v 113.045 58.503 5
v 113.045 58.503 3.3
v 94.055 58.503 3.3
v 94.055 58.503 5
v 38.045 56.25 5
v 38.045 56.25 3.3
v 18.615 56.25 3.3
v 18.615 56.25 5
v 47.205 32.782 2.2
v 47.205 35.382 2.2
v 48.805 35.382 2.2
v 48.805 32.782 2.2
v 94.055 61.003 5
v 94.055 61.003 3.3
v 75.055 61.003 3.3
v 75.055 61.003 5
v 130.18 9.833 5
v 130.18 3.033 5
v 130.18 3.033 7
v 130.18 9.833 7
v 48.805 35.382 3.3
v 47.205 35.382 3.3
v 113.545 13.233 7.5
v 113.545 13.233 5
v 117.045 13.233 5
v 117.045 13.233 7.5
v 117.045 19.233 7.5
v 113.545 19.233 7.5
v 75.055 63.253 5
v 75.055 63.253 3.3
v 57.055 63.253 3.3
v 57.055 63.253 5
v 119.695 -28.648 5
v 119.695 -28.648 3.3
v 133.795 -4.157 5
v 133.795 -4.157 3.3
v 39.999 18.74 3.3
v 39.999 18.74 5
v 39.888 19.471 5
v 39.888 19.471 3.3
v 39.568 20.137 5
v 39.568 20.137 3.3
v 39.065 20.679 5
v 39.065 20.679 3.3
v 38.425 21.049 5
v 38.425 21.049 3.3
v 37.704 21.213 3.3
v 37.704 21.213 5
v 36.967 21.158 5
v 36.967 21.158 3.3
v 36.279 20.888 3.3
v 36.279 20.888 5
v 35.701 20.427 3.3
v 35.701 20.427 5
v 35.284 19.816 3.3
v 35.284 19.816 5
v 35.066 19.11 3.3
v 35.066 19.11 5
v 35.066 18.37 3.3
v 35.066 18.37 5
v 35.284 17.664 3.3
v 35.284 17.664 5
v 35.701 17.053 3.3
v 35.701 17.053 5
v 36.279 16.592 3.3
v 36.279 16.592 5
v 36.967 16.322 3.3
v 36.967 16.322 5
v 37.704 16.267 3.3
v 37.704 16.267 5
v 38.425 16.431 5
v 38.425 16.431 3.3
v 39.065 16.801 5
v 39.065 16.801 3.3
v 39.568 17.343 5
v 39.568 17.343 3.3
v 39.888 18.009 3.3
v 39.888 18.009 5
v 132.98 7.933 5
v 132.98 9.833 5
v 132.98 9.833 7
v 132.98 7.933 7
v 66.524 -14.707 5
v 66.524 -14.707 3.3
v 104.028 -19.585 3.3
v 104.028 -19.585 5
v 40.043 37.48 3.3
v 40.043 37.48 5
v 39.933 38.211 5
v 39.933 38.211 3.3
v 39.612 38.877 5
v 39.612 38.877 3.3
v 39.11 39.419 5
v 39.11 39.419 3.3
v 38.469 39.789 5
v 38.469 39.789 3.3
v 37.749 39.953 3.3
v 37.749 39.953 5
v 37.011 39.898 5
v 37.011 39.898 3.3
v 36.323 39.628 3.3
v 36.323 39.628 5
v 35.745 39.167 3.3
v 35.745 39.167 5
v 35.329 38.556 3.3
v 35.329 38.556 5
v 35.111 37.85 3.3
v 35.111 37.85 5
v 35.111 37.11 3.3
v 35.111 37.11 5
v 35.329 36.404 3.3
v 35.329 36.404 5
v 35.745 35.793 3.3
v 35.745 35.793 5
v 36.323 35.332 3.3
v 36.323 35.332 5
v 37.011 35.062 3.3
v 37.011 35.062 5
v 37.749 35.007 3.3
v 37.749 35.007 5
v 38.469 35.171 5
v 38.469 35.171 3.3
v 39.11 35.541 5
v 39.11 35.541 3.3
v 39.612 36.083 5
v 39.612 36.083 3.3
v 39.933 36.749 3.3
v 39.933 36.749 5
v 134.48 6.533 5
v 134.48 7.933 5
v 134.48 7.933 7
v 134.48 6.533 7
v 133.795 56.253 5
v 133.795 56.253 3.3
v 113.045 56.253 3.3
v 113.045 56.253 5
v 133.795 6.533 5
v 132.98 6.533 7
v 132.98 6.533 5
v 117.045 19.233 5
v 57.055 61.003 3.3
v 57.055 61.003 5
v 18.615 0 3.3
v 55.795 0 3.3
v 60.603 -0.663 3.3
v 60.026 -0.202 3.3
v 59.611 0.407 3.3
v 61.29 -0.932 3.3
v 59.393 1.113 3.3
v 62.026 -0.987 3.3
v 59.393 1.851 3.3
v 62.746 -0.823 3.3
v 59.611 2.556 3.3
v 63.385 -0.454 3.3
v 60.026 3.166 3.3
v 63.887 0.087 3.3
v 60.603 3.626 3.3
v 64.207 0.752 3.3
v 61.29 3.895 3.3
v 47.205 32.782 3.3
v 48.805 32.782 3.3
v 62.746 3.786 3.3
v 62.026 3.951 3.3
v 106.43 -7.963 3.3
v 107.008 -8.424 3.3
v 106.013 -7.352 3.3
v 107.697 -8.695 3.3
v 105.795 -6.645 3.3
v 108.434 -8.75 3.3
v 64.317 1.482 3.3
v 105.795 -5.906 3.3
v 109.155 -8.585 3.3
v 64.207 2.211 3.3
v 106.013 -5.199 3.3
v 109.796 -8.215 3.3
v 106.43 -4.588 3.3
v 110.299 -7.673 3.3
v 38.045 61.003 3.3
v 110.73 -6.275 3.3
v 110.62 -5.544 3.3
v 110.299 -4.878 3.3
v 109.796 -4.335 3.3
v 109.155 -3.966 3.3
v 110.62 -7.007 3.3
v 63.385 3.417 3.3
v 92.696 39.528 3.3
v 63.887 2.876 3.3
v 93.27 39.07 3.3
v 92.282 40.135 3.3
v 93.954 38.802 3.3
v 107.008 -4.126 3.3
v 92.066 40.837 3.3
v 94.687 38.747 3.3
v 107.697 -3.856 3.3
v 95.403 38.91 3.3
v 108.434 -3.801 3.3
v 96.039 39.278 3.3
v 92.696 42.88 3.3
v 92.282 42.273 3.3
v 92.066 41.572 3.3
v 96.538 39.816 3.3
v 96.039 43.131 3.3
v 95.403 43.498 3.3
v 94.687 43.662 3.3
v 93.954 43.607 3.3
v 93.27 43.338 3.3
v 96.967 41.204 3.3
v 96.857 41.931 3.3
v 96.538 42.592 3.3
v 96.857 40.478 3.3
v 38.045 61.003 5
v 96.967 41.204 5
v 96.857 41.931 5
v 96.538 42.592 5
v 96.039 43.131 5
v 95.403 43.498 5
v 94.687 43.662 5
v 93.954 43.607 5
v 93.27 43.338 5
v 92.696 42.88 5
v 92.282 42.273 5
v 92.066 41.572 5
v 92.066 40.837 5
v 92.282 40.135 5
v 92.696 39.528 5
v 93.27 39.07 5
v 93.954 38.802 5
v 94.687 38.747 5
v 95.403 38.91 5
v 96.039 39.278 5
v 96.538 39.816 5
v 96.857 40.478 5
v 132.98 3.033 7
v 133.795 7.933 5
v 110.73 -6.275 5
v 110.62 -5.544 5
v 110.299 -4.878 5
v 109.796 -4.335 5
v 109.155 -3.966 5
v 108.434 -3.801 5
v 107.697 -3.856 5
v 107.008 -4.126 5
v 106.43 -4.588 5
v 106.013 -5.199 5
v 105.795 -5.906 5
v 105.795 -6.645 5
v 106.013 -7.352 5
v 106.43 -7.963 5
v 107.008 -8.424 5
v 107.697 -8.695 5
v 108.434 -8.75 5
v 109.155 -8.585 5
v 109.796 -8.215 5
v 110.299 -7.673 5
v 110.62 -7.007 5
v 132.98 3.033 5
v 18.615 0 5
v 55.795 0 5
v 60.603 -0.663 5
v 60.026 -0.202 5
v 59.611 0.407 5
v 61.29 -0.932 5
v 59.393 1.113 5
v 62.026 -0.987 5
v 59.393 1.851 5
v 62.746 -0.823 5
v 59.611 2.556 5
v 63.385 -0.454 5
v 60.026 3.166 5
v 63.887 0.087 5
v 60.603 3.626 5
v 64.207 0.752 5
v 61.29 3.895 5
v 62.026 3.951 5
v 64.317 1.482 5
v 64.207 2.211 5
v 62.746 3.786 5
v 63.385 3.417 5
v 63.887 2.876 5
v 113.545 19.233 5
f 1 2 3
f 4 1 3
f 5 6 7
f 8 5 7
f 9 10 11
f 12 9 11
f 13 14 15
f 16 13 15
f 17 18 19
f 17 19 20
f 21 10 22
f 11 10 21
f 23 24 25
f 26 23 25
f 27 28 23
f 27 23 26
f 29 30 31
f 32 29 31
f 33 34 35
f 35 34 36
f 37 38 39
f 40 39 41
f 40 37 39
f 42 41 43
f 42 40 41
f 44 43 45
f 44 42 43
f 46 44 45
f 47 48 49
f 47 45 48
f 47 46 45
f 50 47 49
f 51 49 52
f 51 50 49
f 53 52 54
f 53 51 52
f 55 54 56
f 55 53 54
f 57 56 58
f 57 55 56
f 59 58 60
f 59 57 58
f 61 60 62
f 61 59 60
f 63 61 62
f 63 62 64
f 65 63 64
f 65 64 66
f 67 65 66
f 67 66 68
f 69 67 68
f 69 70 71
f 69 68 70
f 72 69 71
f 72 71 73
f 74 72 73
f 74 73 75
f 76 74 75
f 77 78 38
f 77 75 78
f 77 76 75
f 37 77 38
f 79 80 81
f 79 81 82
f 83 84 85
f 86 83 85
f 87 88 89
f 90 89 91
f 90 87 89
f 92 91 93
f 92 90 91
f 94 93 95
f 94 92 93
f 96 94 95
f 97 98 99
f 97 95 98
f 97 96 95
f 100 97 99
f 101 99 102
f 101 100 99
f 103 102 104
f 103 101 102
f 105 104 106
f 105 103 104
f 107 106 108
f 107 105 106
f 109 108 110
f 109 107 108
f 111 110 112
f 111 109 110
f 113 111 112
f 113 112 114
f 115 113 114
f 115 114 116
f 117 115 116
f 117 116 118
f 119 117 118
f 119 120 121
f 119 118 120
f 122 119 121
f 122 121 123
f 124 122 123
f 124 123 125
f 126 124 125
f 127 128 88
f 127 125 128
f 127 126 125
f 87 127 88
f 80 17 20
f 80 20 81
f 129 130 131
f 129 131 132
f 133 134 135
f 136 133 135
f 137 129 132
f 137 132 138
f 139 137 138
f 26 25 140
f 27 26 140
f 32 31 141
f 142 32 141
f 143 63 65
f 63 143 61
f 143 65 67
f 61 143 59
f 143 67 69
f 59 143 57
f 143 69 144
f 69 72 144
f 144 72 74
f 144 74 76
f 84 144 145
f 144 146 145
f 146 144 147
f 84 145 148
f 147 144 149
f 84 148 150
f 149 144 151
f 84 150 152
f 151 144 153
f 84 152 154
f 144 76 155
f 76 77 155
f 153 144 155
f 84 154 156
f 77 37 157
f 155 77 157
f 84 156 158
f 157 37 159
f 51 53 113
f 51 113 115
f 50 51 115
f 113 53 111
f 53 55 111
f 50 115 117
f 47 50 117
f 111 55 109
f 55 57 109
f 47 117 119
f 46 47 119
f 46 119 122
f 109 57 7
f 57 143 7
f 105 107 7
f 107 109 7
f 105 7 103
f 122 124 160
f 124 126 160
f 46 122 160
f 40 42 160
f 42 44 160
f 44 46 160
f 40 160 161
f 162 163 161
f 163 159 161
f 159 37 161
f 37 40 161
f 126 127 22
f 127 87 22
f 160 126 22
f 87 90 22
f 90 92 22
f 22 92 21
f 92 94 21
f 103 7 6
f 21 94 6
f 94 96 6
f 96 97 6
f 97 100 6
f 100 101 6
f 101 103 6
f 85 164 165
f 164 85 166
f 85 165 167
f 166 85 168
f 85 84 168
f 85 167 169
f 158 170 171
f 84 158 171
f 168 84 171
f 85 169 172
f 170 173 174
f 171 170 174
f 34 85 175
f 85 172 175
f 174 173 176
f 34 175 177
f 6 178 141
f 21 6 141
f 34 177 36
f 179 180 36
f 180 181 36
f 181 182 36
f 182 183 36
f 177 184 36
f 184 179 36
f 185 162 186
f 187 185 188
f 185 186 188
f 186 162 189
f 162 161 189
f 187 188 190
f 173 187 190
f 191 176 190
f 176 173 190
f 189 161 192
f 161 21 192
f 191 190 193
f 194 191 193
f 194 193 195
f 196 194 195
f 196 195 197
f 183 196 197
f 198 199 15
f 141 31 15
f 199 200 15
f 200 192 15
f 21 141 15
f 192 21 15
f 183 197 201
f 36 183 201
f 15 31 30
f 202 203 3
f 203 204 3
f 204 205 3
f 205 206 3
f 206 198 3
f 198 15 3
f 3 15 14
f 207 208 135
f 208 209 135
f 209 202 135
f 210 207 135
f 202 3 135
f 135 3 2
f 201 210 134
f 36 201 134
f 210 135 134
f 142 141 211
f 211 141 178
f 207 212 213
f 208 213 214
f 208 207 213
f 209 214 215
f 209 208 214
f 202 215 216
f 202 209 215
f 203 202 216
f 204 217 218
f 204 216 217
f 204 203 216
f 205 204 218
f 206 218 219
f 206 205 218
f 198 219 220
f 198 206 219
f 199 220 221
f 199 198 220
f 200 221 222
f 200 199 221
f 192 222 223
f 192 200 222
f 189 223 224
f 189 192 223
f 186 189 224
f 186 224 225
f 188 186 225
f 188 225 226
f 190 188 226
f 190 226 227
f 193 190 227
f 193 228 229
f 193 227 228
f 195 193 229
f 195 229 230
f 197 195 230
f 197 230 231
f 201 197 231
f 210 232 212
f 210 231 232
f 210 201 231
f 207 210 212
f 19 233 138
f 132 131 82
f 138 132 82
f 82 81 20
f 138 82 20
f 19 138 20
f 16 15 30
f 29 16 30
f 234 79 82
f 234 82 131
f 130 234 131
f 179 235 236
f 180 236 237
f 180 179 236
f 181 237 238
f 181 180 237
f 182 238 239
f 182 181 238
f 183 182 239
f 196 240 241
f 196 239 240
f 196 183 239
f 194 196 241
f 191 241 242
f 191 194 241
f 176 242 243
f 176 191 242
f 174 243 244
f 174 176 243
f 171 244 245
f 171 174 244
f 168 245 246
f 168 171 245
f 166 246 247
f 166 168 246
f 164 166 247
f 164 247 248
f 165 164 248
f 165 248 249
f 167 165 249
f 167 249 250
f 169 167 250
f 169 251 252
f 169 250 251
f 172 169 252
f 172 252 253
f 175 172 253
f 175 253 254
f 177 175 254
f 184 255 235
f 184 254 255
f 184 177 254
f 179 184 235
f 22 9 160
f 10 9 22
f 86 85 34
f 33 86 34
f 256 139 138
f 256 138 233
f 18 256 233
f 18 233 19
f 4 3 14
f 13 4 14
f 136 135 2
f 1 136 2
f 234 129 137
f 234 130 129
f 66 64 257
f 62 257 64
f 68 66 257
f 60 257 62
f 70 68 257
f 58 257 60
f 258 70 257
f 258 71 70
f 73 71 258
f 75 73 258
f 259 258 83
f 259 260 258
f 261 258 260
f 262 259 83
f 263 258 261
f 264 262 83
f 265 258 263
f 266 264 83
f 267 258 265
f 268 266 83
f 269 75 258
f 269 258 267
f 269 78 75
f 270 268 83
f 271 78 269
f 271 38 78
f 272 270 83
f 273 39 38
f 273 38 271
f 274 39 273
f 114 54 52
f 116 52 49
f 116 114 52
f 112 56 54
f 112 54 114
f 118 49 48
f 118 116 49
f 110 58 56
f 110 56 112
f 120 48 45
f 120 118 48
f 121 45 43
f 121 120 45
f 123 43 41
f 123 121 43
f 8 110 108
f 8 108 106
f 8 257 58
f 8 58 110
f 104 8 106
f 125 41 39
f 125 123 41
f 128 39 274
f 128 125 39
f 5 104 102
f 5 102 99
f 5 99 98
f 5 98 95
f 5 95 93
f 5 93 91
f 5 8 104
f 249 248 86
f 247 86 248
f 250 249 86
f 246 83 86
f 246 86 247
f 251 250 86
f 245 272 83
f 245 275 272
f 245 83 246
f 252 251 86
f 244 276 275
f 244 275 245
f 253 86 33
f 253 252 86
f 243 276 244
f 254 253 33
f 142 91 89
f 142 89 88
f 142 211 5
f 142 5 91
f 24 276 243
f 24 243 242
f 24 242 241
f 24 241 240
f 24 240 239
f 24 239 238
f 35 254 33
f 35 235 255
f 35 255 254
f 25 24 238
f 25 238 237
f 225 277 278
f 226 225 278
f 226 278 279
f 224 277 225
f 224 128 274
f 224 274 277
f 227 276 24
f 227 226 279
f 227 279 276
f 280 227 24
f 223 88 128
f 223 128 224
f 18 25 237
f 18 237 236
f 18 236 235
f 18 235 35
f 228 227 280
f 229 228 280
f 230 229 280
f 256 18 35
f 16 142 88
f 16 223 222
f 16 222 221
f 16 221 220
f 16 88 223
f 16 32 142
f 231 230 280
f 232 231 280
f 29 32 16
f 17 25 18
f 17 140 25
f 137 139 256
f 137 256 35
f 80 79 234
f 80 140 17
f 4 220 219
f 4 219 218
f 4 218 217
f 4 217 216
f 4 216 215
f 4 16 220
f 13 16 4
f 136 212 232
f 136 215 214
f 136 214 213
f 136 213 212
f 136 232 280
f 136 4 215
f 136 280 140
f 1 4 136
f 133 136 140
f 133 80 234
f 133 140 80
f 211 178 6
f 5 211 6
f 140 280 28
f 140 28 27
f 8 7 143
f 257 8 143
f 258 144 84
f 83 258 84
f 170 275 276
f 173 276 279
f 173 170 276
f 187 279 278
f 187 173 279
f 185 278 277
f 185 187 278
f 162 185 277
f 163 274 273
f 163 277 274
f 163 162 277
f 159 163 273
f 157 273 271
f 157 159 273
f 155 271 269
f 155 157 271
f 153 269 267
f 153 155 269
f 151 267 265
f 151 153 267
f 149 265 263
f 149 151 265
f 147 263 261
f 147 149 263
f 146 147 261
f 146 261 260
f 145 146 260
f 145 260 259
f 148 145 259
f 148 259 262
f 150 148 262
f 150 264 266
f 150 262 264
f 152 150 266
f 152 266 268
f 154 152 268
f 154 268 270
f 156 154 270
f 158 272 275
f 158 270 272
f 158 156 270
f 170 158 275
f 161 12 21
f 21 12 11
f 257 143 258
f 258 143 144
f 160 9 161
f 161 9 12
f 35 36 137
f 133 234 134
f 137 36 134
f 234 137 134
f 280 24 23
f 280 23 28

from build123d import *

# Parameters (mm, degrees)
PAD011_DEPTH    = 1.7
SKETCH021_R     = 2.475826
SKETCH021_R_2   = 2.481394
SKETCH021_R_3   = 2.464202
SKETCH021_R_4   = 2.48
POCKET021_DEPTH = 2
SKETCH022_W     = 1.6
SKETCH022_H     = 2.6
PAD012_DEPTH    = 1.1
SKETCH025_W     = 3.5
SKETCH025_H     = 6
PAD014_DEPTH    = 2.5
PAD015_DEPTH    = 2


with BuildPart() as part:
    # MirroredSketch016 → Pad011 (new body)
    with BuildSketch(Plane.XY):
        Polygon((18.615471, 0), (55.795471, 0), (66.524073, -14.707193), (104.028226, -19.584789), (119.695382, -28.648464), (133.795471, -4.157341), (133.795471, 56.252659), (113.045471, 56.252659), (113.045471, 58.502659), (94.055471, 58.502659), (94.055471, 61.002659), (75.055471, 61.002659), (75.055471, 63.252659), (57.055471, 63.252659), (57.055471, 61.002659), (38.045471, 61.002659), (38.045471, 56.25), (18.615471, 56.25), align=None)
    extrude(amount=PAD011_DEPTH)

    # Sketch021 → Pocket021 (cut)
    with BuildSketch(Plane.XY):
        with Locations((61.841369, 1.48161)):
            Circle(SKETCH021_R)
        with Locations((108.248942, -6.275442)):
            Circle(SKETCH021_R_2)
        with Locations((94.502421, 41.204275)):
            Circle(SKETCH021_R_3)
        with Locations((37.563327, 37.48)):
            Circle(SKETCH021_R_4)
        with Locations((37.51863, 18.740053)):
            Circle(SKETCH021_R_4)
    extrude(amount=POCKET021_DEPTH, mode=Mode.SUBTRACT)

    # Sketch022 → Pad012 (join)
    with BuildSketch(Plane.XY.offset(-1.1)):
        with Locations((48.005105, 34.081744)):
            Rectangle(SKETCH022_W, SKETCH022_H)
    extrude(amount=PAD012_DEPTH)

    # Sketch025 → Pad014 (join)
    with BuildSketch(Plane(origin=(-22, 35, 1.7), x_dir=(1, 0, 0), z_dir=(0, 0, 1))):
        with Locations((137.295471, -18.767341)):
            Rectangle(SKETCH025_W, SKETCH025_H)
    extrude(amount=PAD014_DEPTH)

    # Sketch026 → Pad015 (join)
    with BuildSketch(Plane.XY.offset(1.7)):
        Polygon((132.98, 3.032659), (130.18, 3.032659), (130.18, 9.832659), (132.98, 9.832659), (132.98, 7.932659), (134.48, 7.932659), (134.48, 6.532659), (132.98, 6.532659), align=None)
    extrude(amount=PAD015_DEPTH)


with BuildPart() as part_1:
    # Body009 placement: moved
    add(part.part.moved(Location((0, 0, 3.3))))


solid = part_1.part
